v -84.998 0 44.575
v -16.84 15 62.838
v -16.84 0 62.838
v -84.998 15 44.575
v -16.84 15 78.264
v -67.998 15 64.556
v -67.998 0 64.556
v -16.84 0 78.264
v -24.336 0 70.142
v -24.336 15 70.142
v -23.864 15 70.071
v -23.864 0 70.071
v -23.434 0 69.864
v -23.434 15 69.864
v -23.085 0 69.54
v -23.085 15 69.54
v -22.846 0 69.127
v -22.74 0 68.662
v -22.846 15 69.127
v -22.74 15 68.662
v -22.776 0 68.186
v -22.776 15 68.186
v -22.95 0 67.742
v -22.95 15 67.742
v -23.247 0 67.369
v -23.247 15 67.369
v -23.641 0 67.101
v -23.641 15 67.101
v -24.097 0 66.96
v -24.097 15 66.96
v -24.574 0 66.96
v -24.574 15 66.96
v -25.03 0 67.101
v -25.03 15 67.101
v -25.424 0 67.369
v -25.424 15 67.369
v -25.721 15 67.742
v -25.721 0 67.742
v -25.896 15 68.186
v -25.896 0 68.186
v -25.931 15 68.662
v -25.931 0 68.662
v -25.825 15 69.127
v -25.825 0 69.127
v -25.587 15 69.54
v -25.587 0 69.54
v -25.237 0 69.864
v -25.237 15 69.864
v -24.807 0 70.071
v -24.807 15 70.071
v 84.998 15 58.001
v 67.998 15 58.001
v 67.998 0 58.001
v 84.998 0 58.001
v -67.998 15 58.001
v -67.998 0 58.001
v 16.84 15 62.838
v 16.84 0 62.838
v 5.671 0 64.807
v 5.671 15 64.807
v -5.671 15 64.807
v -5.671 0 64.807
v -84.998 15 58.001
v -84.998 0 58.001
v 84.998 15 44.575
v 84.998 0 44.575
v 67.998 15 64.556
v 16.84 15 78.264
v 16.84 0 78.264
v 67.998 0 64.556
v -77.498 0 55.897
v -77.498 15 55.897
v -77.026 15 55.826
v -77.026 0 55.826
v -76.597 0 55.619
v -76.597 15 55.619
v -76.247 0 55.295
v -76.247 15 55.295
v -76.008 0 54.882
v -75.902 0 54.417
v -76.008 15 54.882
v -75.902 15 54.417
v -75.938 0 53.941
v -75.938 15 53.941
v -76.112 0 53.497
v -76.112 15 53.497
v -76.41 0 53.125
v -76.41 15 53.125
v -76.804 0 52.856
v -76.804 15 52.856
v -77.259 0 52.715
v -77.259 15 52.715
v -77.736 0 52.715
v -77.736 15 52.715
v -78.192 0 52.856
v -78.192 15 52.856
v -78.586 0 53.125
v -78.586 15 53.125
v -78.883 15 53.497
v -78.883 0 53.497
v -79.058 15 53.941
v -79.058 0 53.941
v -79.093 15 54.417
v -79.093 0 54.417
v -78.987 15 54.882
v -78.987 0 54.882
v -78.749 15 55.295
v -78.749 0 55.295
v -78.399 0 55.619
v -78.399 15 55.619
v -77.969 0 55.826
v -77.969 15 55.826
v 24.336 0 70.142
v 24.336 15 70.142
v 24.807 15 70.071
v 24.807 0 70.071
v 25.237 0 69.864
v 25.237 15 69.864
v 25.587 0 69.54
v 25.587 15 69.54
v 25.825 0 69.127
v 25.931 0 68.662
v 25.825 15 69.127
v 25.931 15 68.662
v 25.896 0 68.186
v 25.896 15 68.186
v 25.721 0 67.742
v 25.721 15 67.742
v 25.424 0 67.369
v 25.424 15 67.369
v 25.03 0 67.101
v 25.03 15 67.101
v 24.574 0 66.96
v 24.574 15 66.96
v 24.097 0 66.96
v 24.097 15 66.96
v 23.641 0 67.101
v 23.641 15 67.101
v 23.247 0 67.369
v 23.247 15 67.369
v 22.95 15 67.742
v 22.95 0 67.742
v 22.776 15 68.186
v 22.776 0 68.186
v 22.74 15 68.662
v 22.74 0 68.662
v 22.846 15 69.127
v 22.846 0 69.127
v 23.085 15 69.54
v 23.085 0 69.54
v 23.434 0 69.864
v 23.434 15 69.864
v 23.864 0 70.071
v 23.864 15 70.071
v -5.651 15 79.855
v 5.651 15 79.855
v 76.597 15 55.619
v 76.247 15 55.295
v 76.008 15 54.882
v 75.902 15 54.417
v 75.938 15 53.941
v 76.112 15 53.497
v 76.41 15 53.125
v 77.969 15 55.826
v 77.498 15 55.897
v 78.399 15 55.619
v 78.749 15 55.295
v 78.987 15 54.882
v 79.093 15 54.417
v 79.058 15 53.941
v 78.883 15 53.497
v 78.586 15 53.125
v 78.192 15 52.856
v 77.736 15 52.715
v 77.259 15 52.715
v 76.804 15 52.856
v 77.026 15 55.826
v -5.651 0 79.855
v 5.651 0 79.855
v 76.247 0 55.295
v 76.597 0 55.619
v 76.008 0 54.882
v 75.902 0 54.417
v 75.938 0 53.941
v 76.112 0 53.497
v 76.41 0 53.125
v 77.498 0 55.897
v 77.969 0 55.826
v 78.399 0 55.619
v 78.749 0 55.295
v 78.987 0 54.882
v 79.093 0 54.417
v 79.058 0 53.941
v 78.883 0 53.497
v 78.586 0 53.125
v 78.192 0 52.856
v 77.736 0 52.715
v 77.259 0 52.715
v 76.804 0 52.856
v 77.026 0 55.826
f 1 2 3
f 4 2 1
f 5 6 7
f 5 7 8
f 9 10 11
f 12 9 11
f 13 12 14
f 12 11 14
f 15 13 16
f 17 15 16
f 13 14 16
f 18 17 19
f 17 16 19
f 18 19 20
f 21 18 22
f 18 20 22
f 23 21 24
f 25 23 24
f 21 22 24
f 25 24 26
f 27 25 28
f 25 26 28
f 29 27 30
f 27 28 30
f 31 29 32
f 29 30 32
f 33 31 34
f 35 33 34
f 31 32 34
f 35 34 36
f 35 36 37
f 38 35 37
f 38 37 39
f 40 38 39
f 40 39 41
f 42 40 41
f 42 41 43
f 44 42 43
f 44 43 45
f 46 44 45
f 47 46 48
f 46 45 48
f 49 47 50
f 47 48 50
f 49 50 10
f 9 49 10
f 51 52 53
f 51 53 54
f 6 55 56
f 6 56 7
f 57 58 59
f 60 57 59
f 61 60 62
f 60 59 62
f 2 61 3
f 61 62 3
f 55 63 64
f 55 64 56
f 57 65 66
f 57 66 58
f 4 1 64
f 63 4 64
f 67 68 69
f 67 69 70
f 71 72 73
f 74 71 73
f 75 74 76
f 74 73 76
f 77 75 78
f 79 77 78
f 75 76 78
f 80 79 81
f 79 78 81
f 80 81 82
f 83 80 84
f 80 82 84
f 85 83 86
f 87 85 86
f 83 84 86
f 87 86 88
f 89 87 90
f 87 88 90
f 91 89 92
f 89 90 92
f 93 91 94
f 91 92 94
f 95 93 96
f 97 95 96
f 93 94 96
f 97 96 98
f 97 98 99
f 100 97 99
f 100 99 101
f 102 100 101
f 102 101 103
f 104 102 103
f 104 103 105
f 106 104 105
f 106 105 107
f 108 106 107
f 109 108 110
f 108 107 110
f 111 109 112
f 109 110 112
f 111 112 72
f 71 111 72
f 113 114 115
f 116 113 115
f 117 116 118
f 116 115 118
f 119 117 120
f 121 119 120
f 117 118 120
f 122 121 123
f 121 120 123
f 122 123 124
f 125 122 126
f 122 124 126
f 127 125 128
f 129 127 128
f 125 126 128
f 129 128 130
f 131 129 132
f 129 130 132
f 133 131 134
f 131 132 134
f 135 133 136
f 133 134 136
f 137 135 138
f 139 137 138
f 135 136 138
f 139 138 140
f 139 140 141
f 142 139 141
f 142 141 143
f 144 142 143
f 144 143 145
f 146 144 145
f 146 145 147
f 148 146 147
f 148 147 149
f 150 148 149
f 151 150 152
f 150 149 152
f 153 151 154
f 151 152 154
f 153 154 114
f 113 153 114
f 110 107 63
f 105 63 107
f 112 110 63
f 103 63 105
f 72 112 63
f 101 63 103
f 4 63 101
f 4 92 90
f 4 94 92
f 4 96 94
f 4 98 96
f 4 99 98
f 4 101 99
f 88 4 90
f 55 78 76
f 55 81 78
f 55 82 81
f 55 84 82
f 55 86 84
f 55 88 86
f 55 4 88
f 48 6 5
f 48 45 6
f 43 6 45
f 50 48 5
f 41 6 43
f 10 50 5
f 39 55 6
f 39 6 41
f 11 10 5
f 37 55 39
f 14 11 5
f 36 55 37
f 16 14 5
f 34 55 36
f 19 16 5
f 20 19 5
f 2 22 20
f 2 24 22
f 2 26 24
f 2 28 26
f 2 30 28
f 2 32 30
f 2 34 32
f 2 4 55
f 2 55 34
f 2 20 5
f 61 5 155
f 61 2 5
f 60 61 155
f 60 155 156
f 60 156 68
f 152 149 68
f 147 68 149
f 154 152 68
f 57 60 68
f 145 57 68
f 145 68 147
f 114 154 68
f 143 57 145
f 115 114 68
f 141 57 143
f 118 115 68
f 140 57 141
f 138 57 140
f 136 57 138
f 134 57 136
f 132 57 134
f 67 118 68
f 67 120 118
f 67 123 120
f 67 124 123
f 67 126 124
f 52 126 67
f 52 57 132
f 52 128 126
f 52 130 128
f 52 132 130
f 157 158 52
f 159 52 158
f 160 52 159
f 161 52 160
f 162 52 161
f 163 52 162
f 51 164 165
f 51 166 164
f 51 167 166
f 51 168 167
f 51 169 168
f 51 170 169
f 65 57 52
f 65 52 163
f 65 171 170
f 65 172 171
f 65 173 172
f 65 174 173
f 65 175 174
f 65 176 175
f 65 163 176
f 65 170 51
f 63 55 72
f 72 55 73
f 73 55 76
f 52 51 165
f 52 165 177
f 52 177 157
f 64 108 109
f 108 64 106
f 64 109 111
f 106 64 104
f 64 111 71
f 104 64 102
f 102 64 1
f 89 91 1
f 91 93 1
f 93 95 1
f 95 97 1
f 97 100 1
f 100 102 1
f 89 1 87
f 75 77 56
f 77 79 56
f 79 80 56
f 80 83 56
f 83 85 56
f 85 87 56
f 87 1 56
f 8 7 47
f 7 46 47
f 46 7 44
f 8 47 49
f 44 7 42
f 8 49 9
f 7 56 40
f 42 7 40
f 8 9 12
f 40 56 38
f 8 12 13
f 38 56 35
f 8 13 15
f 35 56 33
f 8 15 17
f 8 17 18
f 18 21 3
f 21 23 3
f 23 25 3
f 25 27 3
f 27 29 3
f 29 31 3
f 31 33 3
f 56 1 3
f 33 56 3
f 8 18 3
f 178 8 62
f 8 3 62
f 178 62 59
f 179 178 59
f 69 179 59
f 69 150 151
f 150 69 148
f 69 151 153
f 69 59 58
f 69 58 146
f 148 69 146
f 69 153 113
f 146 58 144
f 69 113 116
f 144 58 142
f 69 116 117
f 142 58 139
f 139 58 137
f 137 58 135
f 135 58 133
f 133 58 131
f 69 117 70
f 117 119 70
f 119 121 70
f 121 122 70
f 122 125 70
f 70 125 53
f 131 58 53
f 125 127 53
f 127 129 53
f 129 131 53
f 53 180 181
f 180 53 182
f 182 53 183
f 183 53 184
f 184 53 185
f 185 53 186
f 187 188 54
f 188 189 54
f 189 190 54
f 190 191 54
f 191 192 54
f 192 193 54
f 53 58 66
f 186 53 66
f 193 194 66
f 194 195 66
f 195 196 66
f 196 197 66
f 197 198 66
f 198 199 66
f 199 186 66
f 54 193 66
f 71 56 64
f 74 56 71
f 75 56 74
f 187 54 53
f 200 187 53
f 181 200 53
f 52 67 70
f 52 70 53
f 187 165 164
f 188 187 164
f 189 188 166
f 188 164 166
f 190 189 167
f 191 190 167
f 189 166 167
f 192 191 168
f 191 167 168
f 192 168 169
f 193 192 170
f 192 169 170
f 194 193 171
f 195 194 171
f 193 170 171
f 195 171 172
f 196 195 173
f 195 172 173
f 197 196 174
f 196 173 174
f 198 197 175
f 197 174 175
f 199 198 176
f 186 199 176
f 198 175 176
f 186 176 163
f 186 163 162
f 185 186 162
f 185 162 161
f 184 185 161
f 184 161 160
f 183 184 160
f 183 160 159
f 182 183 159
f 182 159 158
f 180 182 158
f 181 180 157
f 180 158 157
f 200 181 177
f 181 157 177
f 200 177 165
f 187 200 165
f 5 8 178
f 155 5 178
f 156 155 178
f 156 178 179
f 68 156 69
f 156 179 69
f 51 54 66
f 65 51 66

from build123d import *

# Parameters (mm, degrees)
BOSS_EXTRUDE1_DEPTH = 15
SKETCH2_R           = 1.6
BOSS_EXTRUDE2_DEPTH = 15


with BuildPart() as part:
    # Sketch1 → Boss-Extrude1 (new body)
    with BuildSketch(Plane(origin=(0, 0, 0), x_dir=(1, 0, 0), z_dir=(0, 1, 0))):
        with BuildLine():
            ThreePointArc((16.84, -62.837627462), (0, -65.055), (-16.84, -62.837627462))
            Line((-16.84, -62.837627462), (-16.84, -78.263768278))
            ThreePointArc((-16.84, -78.263768278), (0, -80.055), (16.84, -78.263768278))
            Line((16.84, -78.263768278), (16.84, -62.837627462))
        make_face()
    extrude(amount=BOSS_EXTRUDE1_DEPTH)

    # Sketch2 → Boss-Extrude2 (add)
    # profile 1 of 2: a face of its own
    with BuildSketch(Plane(origin=(0, 15, 0), x_dir=(1, 0, 0), z_dir=(0, 1, 0))):
        Polygon((-16.84, -62.837627462), (-84.997835254, -44.574790547), (-84.997835254, -58.000931363), (-67.997835254, -58.000931363), (-67.997835254, -64.556067635), (-16.84, -78.263768278), align=None)
        with Locations(Location((-24.335670508, -68.54223901, 0), (0, 0, 270))):
            Circle(SKETCH2_R, mode=Mode.SUBTRACT)
        with Locations(Location((-77.497835254, -54.297479899, 0), (0, 0, 270))):
            Circle(SKETCH2_R, mode=Mode.SUBTRACT)
    # profile 2 of 2: a face of its own
    with BuildSketch(Plane(origin=(0, 15, 0), x_dir=(1, 0, 0), z_dir=(0, 1, 0))):
        Polygon((84.997835254, -44.574790547), (16.84, -62.837627462), (16.84, -78.263768278), (67.997835254, -64.556067635), (67.997835254, -58.000931363), (84.997835254, -58.000931363), align=None)
        with Locations(Location((24.335670508, -68.54223901, 0), (0, 0, 270))):
            Circle(SKETCH2_R, mode=Mode.SUBTRACT)
        with Locations(Location((77.497835254, -54.297479899, 0), (0, 0, 270))):
            Circle(SKETCH2_R, mode=Mode.SUBTRACT)
    extrude(amount=-BOSS_EXTRUDE2_DEPTH)


solid = part.part
